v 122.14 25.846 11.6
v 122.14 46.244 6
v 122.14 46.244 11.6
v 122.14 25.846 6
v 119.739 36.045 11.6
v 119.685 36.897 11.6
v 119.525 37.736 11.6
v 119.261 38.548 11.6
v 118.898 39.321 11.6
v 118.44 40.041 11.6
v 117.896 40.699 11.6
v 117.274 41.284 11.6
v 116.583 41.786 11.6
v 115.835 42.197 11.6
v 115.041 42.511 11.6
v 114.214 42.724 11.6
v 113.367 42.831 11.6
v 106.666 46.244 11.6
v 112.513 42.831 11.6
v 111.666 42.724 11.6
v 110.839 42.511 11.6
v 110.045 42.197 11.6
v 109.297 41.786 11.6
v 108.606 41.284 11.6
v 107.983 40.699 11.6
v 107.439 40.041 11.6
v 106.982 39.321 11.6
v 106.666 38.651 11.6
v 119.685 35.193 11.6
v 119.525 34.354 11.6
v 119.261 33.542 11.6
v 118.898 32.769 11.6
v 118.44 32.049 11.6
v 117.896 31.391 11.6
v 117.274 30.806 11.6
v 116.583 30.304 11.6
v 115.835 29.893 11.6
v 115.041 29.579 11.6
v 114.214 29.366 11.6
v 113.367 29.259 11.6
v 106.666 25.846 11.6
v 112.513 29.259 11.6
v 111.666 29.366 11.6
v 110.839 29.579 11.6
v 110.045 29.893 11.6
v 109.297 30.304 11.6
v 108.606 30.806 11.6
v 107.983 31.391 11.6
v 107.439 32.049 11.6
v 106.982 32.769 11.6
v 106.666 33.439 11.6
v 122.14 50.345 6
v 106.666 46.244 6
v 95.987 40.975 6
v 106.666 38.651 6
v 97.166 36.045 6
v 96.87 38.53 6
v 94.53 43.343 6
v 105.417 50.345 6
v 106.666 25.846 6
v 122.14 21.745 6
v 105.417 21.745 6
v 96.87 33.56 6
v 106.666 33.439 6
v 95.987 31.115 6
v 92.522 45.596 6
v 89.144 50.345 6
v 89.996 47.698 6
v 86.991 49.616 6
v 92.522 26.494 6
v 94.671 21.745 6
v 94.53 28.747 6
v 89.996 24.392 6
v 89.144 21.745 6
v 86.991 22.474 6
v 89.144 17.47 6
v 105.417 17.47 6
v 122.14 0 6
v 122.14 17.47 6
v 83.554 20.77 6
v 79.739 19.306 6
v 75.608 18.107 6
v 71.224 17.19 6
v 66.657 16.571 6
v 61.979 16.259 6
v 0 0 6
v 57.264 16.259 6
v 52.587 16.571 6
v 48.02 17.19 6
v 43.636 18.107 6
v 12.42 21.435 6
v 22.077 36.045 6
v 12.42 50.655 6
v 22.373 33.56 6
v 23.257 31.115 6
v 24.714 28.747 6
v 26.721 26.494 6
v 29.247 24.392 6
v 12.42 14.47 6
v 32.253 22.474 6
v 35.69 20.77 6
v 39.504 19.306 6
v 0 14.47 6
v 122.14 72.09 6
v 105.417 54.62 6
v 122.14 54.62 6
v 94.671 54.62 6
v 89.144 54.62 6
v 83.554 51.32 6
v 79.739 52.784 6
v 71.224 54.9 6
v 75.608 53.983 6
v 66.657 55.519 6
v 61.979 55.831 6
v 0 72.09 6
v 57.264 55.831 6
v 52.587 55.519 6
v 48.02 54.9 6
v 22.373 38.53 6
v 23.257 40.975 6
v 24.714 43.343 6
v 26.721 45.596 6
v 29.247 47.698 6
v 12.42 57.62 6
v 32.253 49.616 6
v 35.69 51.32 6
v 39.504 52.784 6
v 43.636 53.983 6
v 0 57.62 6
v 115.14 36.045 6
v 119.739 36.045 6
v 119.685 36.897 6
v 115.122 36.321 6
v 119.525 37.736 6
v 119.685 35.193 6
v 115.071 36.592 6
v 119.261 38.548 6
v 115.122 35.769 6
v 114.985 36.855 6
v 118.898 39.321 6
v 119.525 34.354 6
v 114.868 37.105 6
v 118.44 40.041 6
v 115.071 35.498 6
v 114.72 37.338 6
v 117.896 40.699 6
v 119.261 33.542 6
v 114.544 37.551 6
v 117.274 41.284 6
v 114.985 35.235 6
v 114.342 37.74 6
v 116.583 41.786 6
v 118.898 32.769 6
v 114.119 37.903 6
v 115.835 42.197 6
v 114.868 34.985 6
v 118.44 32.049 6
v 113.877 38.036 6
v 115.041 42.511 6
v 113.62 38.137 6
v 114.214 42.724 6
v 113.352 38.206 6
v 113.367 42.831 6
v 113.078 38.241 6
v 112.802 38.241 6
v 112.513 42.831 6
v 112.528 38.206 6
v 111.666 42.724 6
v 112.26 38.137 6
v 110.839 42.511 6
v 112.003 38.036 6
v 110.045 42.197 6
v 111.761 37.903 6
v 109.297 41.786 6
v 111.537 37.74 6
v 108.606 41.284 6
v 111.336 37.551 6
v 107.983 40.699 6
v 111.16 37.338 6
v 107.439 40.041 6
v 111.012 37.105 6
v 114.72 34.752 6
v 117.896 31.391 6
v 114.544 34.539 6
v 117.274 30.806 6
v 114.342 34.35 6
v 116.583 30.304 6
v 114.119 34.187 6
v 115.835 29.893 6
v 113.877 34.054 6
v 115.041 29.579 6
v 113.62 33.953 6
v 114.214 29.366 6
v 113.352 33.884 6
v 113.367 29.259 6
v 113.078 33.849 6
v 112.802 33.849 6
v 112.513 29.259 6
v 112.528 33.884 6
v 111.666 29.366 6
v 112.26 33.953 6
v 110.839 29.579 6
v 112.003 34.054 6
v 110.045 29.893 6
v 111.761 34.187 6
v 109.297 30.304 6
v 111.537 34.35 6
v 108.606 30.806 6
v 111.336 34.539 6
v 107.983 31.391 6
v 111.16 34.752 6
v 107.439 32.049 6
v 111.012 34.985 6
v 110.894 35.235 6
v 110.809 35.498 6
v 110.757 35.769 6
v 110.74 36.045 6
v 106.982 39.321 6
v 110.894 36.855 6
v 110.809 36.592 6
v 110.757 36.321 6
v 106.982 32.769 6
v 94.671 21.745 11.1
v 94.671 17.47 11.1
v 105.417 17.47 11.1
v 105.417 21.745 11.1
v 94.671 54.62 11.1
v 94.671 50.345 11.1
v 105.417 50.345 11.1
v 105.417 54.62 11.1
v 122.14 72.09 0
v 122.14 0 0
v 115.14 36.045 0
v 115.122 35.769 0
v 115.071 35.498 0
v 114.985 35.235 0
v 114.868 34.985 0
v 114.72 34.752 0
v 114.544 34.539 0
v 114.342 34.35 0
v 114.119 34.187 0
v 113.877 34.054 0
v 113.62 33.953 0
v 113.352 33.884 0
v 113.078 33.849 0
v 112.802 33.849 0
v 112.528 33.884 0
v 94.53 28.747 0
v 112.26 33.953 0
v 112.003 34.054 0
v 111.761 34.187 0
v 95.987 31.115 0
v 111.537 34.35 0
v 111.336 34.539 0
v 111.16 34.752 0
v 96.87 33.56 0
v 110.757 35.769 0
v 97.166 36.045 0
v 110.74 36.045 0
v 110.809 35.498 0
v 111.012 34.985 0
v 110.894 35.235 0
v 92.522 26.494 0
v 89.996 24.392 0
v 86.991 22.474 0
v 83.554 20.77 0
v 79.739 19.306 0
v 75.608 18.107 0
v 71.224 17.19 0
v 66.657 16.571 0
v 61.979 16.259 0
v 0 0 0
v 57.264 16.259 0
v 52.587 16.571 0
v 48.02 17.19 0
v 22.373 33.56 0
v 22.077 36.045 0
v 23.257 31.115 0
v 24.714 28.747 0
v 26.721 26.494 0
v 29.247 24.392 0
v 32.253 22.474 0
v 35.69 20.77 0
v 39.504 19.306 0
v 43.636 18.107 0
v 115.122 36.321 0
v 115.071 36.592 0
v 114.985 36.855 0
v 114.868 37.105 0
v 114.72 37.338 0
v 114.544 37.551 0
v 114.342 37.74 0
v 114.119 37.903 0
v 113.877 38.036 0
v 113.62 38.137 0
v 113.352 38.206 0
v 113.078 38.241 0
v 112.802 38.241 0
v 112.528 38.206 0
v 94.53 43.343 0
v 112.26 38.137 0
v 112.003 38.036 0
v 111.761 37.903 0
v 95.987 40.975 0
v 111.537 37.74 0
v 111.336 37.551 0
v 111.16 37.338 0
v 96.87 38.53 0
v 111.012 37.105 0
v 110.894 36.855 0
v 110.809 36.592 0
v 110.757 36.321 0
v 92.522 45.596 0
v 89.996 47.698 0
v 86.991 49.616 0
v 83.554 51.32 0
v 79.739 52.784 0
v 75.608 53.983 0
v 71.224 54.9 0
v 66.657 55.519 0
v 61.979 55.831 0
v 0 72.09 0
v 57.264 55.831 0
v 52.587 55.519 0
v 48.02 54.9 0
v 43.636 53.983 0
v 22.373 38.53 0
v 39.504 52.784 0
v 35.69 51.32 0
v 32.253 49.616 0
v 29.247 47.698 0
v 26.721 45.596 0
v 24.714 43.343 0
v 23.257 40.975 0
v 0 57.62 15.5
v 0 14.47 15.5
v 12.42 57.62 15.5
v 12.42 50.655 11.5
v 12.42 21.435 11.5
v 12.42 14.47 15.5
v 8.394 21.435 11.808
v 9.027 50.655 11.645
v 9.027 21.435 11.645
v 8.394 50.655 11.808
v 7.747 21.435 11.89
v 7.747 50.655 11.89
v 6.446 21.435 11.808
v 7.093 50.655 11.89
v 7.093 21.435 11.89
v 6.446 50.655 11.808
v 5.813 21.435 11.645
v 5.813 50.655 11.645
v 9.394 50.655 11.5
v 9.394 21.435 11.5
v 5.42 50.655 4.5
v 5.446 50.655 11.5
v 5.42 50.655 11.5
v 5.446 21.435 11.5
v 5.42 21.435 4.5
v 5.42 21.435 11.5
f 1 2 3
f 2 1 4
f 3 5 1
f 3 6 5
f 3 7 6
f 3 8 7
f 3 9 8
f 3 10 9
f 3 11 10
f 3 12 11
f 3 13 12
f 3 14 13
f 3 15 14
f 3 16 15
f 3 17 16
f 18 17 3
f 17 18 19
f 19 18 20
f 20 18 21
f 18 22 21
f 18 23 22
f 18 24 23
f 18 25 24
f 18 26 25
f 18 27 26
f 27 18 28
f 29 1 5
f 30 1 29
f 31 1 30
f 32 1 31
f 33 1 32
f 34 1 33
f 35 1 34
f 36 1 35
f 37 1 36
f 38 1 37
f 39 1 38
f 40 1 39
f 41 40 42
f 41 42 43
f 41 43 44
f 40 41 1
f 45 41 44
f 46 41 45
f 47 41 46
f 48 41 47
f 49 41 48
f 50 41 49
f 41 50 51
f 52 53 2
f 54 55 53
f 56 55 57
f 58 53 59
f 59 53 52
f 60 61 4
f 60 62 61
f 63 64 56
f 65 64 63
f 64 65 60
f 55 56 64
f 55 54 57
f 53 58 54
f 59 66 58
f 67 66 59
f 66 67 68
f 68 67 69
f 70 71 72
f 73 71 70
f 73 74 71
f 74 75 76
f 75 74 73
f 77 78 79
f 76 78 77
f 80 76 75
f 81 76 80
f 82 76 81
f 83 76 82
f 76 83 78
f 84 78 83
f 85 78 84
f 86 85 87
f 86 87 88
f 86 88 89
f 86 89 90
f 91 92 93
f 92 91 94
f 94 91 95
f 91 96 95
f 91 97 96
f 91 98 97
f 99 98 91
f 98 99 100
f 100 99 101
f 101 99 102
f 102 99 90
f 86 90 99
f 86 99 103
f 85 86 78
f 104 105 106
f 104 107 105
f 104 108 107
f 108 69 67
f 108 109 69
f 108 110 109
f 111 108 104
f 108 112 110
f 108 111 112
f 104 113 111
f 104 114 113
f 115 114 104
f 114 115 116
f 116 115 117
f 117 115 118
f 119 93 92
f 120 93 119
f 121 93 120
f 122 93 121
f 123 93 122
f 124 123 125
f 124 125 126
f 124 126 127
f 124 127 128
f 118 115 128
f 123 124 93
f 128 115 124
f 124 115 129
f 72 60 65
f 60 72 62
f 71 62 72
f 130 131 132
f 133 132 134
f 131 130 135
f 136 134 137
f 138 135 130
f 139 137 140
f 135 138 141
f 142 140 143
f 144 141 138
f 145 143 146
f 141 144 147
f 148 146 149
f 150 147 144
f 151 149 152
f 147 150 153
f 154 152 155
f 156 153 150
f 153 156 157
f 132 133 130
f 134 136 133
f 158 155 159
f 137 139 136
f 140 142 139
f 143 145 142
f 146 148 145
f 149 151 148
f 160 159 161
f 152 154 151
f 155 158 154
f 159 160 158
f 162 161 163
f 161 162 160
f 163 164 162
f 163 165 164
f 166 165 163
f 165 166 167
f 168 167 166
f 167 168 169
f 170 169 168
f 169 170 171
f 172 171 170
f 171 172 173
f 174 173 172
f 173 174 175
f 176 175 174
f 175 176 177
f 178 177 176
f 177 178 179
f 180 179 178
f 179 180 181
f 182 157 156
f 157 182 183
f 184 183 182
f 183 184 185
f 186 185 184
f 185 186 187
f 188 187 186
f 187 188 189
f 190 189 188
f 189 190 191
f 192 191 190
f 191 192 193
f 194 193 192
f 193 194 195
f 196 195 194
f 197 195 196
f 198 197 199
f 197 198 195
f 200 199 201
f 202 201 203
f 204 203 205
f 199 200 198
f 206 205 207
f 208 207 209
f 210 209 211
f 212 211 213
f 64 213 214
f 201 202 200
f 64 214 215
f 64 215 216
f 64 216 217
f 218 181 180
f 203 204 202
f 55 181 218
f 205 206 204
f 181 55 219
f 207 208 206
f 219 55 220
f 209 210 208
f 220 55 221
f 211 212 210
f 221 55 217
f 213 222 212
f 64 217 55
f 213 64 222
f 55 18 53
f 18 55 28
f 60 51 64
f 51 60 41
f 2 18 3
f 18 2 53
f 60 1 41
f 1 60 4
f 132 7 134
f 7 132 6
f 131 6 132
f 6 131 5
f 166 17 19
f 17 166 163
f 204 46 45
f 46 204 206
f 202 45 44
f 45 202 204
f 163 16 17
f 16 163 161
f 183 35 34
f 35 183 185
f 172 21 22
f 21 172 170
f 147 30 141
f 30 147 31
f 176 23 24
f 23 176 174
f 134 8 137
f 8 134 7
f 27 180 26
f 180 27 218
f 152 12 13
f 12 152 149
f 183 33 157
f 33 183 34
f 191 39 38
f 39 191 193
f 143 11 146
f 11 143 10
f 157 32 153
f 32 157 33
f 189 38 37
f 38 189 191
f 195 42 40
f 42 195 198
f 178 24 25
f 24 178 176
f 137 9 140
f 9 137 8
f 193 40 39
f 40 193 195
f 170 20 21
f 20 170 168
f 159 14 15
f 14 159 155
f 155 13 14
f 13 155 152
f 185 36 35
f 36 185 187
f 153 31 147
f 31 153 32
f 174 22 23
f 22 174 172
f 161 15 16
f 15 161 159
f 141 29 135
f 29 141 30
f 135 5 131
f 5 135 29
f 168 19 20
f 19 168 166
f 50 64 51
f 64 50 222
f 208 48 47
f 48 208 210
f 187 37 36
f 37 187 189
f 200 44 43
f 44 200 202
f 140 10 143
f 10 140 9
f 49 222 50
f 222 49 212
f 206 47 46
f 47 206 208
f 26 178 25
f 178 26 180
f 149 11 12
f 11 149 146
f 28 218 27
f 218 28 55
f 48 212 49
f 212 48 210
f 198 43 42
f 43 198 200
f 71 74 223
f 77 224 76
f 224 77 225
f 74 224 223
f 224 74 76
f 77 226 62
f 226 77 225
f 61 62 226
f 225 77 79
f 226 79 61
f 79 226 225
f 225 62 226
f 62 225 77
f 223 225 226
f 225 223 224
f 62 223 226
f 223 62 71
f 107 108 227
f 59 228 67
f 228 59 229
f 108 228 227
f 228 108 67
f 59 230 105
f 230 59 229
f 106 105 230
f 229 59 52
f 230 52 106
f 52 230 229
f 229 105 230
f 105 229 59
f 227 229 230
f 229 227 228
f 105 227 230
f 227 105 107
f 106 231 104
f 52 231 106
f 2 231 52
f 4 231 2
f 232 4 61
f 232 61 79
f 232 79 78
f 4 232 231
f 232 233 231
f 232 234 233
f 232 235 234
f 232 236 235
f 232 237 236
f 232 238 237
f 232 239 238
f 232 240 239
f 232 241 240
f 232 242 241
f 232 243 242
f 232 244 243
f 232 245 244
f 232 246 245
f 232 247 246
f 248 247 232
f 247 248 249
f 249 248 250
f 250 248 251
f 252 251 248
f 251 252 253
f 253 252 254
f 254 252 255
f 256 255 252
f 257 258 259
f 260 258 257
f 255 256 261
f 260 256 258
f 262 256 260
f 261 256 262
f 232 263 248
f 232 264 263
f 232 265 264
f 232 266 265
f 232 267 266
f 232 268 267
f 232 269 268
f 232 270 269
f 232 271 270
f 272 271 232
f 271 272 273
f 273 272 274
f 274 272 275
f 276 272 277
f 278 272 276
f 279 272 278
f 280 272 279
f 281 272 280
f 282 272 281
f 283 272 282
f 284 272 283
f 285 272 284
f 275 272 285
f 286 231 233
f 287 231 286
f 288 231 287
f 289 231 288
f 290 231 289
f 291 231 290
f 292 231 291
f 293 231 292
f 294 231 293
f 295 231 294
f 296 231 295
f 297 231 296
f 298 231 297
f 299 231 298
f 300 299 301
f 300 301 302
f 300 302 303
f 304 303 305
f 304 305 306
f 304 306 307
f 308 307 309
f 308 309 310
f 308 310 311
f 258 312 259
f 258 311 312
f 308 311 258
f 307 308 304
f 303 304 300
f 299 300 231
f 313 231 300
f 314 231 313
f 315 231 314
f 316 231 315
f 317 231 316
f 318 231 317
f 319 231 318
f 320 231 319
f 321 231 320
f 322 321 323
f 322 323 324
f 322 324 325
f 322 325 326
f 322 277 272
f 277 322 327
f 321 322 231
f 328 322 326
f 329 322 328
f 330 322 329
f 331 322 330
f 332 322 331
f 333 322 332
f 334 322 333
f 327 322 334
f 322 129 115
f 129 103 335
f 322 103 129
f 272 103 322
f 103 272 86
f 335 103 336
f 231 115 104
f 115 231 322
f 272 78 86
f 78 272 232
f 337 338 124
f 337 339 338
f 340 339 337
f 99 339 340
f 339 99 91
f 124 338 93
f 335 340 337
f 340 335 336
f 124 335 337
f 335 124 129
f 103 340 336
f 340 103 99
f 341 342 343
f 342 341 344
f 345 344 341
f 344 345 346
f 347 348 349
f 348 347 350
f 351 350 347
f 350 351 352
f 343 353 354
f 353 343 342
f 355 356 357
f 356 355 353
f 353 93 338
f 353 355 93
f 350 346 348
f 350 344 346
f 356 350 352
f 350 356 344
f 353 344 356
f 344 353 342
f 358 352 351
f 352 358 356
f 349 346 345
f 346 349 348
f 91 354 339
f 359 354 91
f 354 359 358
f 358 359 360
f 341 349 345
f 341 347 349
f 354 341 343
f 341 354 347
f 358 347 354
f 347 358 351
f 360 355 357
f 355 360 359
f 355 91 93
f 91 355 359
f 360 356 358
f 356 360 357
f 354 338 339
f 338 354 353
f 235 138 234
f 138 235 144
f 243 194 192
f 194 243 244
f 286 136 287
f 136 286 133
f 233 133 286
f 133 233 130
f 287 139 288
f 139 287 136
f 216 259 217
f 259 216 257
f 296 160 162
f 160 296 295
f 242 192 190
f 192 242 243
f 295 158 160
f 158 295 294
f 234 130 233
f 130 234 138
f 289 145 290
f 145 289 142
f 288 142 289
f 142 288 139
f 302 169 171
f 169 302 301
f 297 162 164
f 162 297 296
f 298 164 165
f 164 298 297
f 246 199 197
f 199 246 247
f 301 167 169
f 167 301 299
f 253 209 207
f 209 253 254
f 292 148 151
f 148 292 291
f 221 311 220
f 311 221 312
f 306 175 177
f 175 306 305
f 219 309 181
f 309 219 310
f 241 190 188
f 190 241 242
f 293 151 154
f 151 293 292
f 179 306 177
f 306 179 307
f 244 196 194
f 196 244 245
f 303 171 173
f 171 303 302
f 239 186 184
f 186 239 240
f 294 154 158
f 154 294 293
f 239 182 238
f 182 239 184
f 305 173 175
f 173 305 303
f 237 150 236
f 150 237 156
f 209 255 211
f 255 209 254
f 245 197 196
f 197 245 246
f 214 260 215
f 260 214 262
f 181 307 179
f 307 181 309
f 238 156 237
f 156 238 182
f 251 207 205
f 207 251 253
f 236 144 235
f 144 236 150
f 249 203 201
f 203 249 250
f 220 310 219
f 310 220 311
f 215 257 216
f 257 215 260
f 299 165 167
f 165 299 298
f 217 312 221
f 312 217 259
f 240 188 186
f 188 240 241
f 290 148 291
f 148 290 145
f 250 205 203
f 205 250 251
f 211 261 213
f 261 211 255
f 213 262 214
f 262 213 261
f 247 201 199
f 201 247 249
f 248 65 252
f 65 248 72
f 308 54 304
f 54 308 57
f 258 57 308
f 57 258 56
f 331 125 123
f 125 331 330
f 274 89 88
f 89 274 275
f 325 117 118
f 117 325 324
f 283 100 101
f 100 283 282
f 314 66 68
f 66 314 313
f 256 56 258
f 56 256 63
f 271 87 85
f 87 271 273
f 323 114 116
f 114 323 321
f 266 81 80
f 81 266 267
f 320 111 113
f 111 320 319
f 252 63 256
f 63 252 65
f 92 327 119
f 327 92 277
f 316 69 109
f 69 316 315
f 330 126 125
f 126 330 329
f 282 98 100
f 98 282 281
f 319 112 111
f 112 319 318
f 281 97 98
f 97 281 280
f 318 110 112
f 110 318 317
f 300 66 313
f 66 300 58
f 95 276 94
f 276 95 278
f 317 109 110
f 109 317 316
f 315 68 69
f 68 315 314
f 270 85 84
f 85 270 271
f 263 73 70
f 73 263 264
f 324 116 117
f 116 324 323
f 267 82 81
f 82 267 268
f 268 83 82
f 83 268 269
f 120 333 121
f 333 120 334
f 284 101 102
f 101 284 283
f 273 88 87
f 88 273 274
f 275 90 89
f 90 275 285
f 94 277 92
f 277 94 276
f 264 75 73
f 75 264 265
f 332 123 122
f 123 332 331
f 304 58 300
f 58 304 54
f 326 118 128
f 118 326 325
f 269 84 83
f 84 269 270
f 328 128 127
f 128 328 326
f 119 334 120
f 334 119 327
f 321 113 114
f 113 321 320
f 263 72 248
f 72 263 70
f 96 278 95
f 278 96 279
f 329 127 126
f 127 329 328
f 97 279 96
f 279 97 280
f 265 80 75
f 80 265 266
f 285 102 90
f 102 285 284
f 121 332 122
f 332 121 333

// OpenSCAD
/*
OpenSCAD reverse engineering of RichRap's Quick-Fit attachment plate.
( https://www.thingiverse.com/thing:19590 )

It's intended to be used in the construction of other x-carriages etc.,
not used on its own - it currently doesn't have any kind of anchor-point.
I plan on making a RepRap Snappy extruder plaform for the quick-fit
attachment.

Note: the hinge doesn't print well, when the model is printed flat.
When I printed it hinge-end-down, standing up, it actually printed decently.
A little rough near the latch, but functional.  I did thicken the plate
from 4.28mm to 6mm, to improve stability while printing.

I've taken most measurements from the STL files, presumably derived from
the SketchUp files, so the numbers are pretty arbitrary-looking.  The
only deviations-from-source I know of are:
1. I stripped off the x-carriage bits
2. Also skipped the zip-tie holes and grooves
3. The shape of the big tool-hole in the middle was somewhat inscrutable, so now it's an ellipse
4. Technically the resolution of the circles may be different
I think everything else should be accurate to within a hundredth of a mm.
*/

$fn = 50;

PLATE_SIZE_Z = 6; //4.28
PLATE_SIZE_X = 122.1398;
PLATE_SIZE_Y = 72.09;

HINGE_FLOOR_X = 20.5;

LATCH_SEAT_SMALL_HOLE_DIAM = 4.4;
LATCH_SEAT_BIG_HOLE_DIAM = 13.5983;
LATCH_SEAT_HOLE_X_OFFSET = 6.2733;
LATCH_SEAT_SIZE_X = 15.4733;
LATCH_SEAT_SIZE_Y = LATCH_SEAT_BIG_HOLE_DIAM*1.5;//TODO
LATCH_SEAT_SIZE_Z = 5.6;

// Side ramps are assumed to end at the edge of the plate
SIDE_RAMP_GAP_Y = 28.6;
SIDE_RAMP_SIZE_Y = 4.275;
SIDE_RAMP_SIZE_Z = 5.1;
SIDE_RAMP_1_SIZE_X = 5.5267; // Short one near center
SIDE_RAMP_2_SIZE_X = 10.7464; // Flat segment
SIDE_RAMP_3_SIZE_X = 16.7225; // Long one near edge

TOOL_HOLE_SIZE_Y = 39.65;
TOOL_HOLE_HINGE_X = 22.077;
TOOL_HOLE_LATCH_X = 24.9733;
TOOL_HOLE_SIZE_X = PLATE_SIZE_X - TOOL_HOLE_HINGE_X - TOOL_HOLE_LATCH_X;

HINGE_OUTER_SIZE_X = 12.42;
HINGE_OUTER_SIZE_Y = 43.15;
HINGE_OUTER_SIZE_Z = 9.5 + PLATE_SIZE_Z;

// Some of these params may not lead to reasonable results if other params are changed - it's kindof a complicated shape, and I haven't worked out the most robustly sensical representation.  Particularly the circular cutout in the hinge.
HINGE_INNER_SIZE_Y = 29.22;
HINGE_INNER_BLOCK_SIZE_X = 7;
HINGE_OVERHANG_SIZE_Z = 4;
HINGE_INNER_BLOCK_SIZE_Z = HINGE_OUTER_SIZE_Z - PLATE_SIZE_Z - HINGE_OVERHANG_SIZE_Z;
HINGE_CIRCLE_CUTOUT_DIAMETER = 10.4;
HINGE_CIRCLE_CUTOUT_REGION_X = 4;
HINGE_CIRCLE_CUTOUT_OFFSET_Z = 0.7;
HINGE_RAMP_SIZE_Z = 1.5;

difference() {
  union() {
    { // Plate
      cube([PLATE_SIZE_X, PLATE_SIZE_Y, PLATE_SIZE_Z]);
    }
    { // Latch seat
      translate([PLATE_SIZE_X-LATCH_SEAT_SIZE_X, (PLATE_SIZE_Y-LATCH_SEAT_SIZE_Y)/2, PLATE_SIZE_Z]) {
        difference() {
          cube([LATCH_SEAT_SIZE_X, LATCH_SEAT_SIZE_Y, LATCH_SEAT_SIZE_Z]);
          translate([LATCH_SEAT_HOLE_X_OFFSET, LATCH_SEAT_SIZE_Y/2, 0]) {
            cylinder(d=LATCH_SEAT_BIG_HOLE_DIAM, h=LATCH_SEAT_SIZE_Z);
          };
        };
      };
    }
    { // Side ramps
      for (i = [-1,1]) {
        translate([0, i * ((SIDE_RAMP_GAP_Y+SIDE_RAMP_SIZE_Y)/2), 0]) {
          translate([PLATE_SIZE_X - SIDE_RAMP_1_SIZE_X - SIDE_RAMP_2_SIZE_X - SIDE_RAMP_3_SIZE_X, (PLATE_SIZE_Y - SIDE_RAMP_SIZE_Y)/2, PLATE_SIZE_Z]) {
            translate([0,0,0]) {
              scale([SIDE_RAMP_1_SIZE_X, SIDE_RAMP_SIZE_Y, SIDE_RAMP_SIZE_Z]) {
                difference() {
                  cube(1);
                  rotate([0,-45,0])
                    cube(2);
                }
              }
            }
            translate([SIDE_RAMP_1_SIZE_X,0,0]) {
              cube([SIDE_RAMP_2_SIZE_X,SIDE_RAMP_SIZE_Y,SIDE_RAMP_SIZE_Z]);
            }
            translate([SIDE_RAMP_1_SIZE_X+SIDE_RAMP_2_SIZE_X,0,0]) {
              scale([SIDE_RAMP_3_SIZE_X, SIDE_RAMP_SIZE_Y, SIDE_RAMP_SIZE_Z]) {
                translate([0,0,1])
                rotate([0,90,0])
                difference() {
                  cube(1);
                  rotate([0,-45,0])
                    cube(2);
                }
              }
            }
          }
        }
      }
    }
    { // Hinge additive
      translate([0, (PLATE_SIZE_Y-HINGE_OUTER_SIZE_Y)/2, 0])
        cube([HINGE_OUTER_SIZE_X, HINGE_OUTER_SIZE_Y, HINGE_OUTER_SIZE_Z]);
    }
  };
  { // Latch hole
    translate([PLATE_SIZE_X-LATCH_SEAT_SIZE_X, (PLATE_SIZE_Y-LATCH_SEAT_SIZE_Y)/2, 0]) {
      translate([LATCH_SEAT_HOLE_X_OFFSET, LATCH_SEAT_SIZE_Y/2, 0]) {
        cylinder(d=LATCH_SEAT_SMALL_HOLE_DIAM, h=PLATE_SIZE_Z);
      };
    };
  }
  { // Tool hole
    // This isn't exactly the (arcane) shape of the original, but maybe it's close enough.
    translate([TOOL_HOLE_HINGE_X, (PLATE_SIZE_Y-TOOL_HOLE_SIZE_Y)/2, 0]) {
      translate([TOOL_HOLE_SIZE_X/2, TOOL_HOLE_SIZE_Y/2, 0]) {
        scale([TOOL_HOLE_SIZE_X, TOOL_HOLE_SIZE_Y, PLATE_SIZE_Z]){
          cylinder(d=1,h=1);
        }
      }
    }
  }
  { // Hinge subtractive
    translate([HINGE_OUTER_SIZE_X-HINGE_INNER_BLOCK_SIZE_X, (PLATE_SIZE_Y-HINGE_INNER_SIZE_Y)/2, PLATE_SIZE_Z]) {
      union() {
        cube([HINGE_INNER_BLOCK_SIZE_X, HINGE_INNER_SIZE_Y, HINGE_INNER_BLOCK_SIZE_Z]);
        translate([0,0,HINGE_CIRCLE_CUTOUT_OFFSET_Z])
          intersection() {
            translate([HINGE_CIRCLE_CUTOUT_REGION_X/2, 0, 0])
              rotate([-90,0,0])
                cylinder(d=HINGE_CIRCLE_CUTOUT_DIAMETER, h=HINGE_INNER_SIZE_Y);
            cube([HINGE_CIRCLE_CUTOUT_REGION_X, HINGE_INNER_SIZE_Y, HINGE_CIRCLE_CUTOUT_DIAMETER]);
          };
        scale([HINGE_INNER_BLOCK_SIZE_X, 1, HINGE_RAMP_SIZE_Z])
          translate([0,0,-1])
            difference() {
              cube([1, HINGE_INNER_SIZE_Y, 1]);
              rotate([0, 45, 0])
                cube([2, HINGE_INNER_SIZE_Y, 2]);
            };
      }
    }
  }
  /*
  { // Debug cross-section
    cube([PLATE_SIZE_X, 30, 50]);
    translate([0, 31, 0])
      cube([PLATE_SIZE_X, 300, 50]);
  }
  */
};
